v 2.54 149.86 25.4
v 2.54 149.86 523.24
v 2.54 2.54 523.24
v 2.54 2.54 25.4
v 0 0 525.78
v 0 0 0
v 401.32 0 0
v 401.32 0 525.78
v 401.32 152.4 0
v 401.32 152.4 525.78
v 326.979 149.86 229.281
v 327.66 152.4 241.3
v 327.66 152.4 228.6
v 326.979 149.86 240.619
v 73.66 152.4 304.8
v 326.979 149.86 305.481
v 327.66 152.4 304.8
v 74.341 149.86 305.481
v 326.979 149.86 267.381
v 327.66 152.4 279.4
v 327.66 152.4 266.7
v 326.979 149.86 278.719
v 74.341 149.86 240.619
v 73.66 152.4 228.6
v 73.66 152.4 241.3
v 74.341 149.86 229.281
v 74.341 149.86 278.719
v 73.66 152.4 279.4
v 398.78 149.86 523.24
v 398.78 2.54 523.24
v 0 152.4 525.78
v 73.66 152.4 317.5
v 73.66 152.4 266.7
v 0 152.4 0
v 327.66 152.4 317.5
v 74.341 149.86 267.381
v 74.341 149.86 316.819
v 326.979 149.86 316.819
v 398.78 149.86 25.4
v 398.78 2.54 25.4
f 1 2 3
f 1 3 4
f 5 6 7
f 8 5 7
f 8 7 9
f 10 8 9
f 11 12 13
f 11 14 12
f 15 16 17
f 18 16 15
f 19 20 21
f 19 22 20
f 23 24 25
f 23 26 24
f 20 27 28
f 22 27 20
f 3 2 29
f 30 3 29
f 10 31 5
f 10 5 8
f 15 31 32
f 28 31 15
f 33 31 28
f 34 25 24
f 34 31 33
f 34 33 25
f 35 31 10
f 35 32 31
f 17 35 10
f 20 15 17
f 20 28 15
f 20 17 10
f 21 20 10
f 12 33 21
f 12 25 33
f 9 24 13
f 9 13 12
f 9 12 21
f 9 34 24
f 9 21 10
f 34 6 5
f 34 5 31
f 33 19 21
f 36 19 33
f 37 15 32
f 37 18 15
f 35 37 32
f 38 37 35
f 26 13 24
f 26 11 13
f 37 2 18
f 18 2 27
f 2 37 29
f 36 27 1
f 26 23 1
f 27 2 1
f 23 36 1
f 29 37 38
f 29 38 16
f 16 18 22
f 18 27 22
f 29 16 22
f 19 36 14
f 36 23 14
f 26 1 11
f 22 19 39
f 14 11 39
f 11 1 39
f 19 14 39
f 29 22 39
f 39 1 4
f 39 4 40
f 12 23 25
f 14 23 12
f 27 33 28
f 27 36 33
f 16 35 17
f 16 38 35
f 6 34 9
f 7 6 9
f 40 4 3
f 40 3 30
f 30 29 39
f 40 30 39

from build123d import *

# Parameters (mm, degrees)
SKETCH2_W           = 401.32
SKETCH2_H           = 152.4
BOSS_EXTRUDE1_DEPTH = 525.78
SKETCH3_W           = 396.24
SKETCH3_H           = 497.84
CUT_EXTRUDE1_DEPTH  = 149.86
SKETCH4_W           = 396.24
SKETCH4_H           = 497.84
BOSS_EXTRUDE3_DEPTH = 2.54
SKETCH8_W           = 254
SKETCH8_H           = 12.7
CUT_EXTRUDE2_DEPTH  = 2.54
CUT_EXTRUDE2_TAPER  = 15


with BuildPart() as part:
    # Sketch2 → Boss-Extrude1 (new body)
    with BuildSketch(Plane.XY):
        with Locations((200.66, 76.2)):
            Rectangle(SKETCH2_W, SKETCH2_H)
    extrude(amount=BOSS_EXTRUDE1_DEPTH)

    # Sketch3 → Cut-Extrude1 (cut)
    with BuildSketch(Plane(origin=(0, 152.4, 0), x_dir=(1, 0, 0), z_dir=(0, 1, 0))):
        with Locations((200.66, -274.32)):
            Rectangle(SKETCH3_W, SKETCH3_H)
    extrude(amount=-CUT_EXTRUDE1_DEPTH, mode=Mode.SUBTRACT)

    # Sketch4 → Boss-Extrude3 (add)
    with BuildSketch(Plane(origin=(0, 152.4, 0), x_dir=(1, 0, 0), z_dir=(0, 1, 0))):
        with Locations((200.66, -274.32)):
            Rectangle(SKETCH4_W, SKETCH4_H)
    extrude(amount=-BOSS_EXTRUDE3_DEPTH)

    # Sketch8 → Cut-Extrude2 (cut)
    with BuildSketch(Plane(origin=(0, 152.4, 0), x_dir=(1, 0, 0), z_dir=(0, 1, 0))):
        with Locations((200.66, -273.05)):
            Rectangle(SKETCH8_W, SKETCH8_H)
        with Locations((200.66, -234.95)):
            Rectangle(SKETCH8_W, SKETCH8_H)
        with Locations((200.66, -311.15)):
            Rectangle(SKETCH8_W, SKETCH8_H)
    extrude(amount=-CUT_EXTRUDE2_DEPTH, taper=CUT_EXTRUDE2_TAPER, mode=Mode.SUBTRACT)


solid = part.part
